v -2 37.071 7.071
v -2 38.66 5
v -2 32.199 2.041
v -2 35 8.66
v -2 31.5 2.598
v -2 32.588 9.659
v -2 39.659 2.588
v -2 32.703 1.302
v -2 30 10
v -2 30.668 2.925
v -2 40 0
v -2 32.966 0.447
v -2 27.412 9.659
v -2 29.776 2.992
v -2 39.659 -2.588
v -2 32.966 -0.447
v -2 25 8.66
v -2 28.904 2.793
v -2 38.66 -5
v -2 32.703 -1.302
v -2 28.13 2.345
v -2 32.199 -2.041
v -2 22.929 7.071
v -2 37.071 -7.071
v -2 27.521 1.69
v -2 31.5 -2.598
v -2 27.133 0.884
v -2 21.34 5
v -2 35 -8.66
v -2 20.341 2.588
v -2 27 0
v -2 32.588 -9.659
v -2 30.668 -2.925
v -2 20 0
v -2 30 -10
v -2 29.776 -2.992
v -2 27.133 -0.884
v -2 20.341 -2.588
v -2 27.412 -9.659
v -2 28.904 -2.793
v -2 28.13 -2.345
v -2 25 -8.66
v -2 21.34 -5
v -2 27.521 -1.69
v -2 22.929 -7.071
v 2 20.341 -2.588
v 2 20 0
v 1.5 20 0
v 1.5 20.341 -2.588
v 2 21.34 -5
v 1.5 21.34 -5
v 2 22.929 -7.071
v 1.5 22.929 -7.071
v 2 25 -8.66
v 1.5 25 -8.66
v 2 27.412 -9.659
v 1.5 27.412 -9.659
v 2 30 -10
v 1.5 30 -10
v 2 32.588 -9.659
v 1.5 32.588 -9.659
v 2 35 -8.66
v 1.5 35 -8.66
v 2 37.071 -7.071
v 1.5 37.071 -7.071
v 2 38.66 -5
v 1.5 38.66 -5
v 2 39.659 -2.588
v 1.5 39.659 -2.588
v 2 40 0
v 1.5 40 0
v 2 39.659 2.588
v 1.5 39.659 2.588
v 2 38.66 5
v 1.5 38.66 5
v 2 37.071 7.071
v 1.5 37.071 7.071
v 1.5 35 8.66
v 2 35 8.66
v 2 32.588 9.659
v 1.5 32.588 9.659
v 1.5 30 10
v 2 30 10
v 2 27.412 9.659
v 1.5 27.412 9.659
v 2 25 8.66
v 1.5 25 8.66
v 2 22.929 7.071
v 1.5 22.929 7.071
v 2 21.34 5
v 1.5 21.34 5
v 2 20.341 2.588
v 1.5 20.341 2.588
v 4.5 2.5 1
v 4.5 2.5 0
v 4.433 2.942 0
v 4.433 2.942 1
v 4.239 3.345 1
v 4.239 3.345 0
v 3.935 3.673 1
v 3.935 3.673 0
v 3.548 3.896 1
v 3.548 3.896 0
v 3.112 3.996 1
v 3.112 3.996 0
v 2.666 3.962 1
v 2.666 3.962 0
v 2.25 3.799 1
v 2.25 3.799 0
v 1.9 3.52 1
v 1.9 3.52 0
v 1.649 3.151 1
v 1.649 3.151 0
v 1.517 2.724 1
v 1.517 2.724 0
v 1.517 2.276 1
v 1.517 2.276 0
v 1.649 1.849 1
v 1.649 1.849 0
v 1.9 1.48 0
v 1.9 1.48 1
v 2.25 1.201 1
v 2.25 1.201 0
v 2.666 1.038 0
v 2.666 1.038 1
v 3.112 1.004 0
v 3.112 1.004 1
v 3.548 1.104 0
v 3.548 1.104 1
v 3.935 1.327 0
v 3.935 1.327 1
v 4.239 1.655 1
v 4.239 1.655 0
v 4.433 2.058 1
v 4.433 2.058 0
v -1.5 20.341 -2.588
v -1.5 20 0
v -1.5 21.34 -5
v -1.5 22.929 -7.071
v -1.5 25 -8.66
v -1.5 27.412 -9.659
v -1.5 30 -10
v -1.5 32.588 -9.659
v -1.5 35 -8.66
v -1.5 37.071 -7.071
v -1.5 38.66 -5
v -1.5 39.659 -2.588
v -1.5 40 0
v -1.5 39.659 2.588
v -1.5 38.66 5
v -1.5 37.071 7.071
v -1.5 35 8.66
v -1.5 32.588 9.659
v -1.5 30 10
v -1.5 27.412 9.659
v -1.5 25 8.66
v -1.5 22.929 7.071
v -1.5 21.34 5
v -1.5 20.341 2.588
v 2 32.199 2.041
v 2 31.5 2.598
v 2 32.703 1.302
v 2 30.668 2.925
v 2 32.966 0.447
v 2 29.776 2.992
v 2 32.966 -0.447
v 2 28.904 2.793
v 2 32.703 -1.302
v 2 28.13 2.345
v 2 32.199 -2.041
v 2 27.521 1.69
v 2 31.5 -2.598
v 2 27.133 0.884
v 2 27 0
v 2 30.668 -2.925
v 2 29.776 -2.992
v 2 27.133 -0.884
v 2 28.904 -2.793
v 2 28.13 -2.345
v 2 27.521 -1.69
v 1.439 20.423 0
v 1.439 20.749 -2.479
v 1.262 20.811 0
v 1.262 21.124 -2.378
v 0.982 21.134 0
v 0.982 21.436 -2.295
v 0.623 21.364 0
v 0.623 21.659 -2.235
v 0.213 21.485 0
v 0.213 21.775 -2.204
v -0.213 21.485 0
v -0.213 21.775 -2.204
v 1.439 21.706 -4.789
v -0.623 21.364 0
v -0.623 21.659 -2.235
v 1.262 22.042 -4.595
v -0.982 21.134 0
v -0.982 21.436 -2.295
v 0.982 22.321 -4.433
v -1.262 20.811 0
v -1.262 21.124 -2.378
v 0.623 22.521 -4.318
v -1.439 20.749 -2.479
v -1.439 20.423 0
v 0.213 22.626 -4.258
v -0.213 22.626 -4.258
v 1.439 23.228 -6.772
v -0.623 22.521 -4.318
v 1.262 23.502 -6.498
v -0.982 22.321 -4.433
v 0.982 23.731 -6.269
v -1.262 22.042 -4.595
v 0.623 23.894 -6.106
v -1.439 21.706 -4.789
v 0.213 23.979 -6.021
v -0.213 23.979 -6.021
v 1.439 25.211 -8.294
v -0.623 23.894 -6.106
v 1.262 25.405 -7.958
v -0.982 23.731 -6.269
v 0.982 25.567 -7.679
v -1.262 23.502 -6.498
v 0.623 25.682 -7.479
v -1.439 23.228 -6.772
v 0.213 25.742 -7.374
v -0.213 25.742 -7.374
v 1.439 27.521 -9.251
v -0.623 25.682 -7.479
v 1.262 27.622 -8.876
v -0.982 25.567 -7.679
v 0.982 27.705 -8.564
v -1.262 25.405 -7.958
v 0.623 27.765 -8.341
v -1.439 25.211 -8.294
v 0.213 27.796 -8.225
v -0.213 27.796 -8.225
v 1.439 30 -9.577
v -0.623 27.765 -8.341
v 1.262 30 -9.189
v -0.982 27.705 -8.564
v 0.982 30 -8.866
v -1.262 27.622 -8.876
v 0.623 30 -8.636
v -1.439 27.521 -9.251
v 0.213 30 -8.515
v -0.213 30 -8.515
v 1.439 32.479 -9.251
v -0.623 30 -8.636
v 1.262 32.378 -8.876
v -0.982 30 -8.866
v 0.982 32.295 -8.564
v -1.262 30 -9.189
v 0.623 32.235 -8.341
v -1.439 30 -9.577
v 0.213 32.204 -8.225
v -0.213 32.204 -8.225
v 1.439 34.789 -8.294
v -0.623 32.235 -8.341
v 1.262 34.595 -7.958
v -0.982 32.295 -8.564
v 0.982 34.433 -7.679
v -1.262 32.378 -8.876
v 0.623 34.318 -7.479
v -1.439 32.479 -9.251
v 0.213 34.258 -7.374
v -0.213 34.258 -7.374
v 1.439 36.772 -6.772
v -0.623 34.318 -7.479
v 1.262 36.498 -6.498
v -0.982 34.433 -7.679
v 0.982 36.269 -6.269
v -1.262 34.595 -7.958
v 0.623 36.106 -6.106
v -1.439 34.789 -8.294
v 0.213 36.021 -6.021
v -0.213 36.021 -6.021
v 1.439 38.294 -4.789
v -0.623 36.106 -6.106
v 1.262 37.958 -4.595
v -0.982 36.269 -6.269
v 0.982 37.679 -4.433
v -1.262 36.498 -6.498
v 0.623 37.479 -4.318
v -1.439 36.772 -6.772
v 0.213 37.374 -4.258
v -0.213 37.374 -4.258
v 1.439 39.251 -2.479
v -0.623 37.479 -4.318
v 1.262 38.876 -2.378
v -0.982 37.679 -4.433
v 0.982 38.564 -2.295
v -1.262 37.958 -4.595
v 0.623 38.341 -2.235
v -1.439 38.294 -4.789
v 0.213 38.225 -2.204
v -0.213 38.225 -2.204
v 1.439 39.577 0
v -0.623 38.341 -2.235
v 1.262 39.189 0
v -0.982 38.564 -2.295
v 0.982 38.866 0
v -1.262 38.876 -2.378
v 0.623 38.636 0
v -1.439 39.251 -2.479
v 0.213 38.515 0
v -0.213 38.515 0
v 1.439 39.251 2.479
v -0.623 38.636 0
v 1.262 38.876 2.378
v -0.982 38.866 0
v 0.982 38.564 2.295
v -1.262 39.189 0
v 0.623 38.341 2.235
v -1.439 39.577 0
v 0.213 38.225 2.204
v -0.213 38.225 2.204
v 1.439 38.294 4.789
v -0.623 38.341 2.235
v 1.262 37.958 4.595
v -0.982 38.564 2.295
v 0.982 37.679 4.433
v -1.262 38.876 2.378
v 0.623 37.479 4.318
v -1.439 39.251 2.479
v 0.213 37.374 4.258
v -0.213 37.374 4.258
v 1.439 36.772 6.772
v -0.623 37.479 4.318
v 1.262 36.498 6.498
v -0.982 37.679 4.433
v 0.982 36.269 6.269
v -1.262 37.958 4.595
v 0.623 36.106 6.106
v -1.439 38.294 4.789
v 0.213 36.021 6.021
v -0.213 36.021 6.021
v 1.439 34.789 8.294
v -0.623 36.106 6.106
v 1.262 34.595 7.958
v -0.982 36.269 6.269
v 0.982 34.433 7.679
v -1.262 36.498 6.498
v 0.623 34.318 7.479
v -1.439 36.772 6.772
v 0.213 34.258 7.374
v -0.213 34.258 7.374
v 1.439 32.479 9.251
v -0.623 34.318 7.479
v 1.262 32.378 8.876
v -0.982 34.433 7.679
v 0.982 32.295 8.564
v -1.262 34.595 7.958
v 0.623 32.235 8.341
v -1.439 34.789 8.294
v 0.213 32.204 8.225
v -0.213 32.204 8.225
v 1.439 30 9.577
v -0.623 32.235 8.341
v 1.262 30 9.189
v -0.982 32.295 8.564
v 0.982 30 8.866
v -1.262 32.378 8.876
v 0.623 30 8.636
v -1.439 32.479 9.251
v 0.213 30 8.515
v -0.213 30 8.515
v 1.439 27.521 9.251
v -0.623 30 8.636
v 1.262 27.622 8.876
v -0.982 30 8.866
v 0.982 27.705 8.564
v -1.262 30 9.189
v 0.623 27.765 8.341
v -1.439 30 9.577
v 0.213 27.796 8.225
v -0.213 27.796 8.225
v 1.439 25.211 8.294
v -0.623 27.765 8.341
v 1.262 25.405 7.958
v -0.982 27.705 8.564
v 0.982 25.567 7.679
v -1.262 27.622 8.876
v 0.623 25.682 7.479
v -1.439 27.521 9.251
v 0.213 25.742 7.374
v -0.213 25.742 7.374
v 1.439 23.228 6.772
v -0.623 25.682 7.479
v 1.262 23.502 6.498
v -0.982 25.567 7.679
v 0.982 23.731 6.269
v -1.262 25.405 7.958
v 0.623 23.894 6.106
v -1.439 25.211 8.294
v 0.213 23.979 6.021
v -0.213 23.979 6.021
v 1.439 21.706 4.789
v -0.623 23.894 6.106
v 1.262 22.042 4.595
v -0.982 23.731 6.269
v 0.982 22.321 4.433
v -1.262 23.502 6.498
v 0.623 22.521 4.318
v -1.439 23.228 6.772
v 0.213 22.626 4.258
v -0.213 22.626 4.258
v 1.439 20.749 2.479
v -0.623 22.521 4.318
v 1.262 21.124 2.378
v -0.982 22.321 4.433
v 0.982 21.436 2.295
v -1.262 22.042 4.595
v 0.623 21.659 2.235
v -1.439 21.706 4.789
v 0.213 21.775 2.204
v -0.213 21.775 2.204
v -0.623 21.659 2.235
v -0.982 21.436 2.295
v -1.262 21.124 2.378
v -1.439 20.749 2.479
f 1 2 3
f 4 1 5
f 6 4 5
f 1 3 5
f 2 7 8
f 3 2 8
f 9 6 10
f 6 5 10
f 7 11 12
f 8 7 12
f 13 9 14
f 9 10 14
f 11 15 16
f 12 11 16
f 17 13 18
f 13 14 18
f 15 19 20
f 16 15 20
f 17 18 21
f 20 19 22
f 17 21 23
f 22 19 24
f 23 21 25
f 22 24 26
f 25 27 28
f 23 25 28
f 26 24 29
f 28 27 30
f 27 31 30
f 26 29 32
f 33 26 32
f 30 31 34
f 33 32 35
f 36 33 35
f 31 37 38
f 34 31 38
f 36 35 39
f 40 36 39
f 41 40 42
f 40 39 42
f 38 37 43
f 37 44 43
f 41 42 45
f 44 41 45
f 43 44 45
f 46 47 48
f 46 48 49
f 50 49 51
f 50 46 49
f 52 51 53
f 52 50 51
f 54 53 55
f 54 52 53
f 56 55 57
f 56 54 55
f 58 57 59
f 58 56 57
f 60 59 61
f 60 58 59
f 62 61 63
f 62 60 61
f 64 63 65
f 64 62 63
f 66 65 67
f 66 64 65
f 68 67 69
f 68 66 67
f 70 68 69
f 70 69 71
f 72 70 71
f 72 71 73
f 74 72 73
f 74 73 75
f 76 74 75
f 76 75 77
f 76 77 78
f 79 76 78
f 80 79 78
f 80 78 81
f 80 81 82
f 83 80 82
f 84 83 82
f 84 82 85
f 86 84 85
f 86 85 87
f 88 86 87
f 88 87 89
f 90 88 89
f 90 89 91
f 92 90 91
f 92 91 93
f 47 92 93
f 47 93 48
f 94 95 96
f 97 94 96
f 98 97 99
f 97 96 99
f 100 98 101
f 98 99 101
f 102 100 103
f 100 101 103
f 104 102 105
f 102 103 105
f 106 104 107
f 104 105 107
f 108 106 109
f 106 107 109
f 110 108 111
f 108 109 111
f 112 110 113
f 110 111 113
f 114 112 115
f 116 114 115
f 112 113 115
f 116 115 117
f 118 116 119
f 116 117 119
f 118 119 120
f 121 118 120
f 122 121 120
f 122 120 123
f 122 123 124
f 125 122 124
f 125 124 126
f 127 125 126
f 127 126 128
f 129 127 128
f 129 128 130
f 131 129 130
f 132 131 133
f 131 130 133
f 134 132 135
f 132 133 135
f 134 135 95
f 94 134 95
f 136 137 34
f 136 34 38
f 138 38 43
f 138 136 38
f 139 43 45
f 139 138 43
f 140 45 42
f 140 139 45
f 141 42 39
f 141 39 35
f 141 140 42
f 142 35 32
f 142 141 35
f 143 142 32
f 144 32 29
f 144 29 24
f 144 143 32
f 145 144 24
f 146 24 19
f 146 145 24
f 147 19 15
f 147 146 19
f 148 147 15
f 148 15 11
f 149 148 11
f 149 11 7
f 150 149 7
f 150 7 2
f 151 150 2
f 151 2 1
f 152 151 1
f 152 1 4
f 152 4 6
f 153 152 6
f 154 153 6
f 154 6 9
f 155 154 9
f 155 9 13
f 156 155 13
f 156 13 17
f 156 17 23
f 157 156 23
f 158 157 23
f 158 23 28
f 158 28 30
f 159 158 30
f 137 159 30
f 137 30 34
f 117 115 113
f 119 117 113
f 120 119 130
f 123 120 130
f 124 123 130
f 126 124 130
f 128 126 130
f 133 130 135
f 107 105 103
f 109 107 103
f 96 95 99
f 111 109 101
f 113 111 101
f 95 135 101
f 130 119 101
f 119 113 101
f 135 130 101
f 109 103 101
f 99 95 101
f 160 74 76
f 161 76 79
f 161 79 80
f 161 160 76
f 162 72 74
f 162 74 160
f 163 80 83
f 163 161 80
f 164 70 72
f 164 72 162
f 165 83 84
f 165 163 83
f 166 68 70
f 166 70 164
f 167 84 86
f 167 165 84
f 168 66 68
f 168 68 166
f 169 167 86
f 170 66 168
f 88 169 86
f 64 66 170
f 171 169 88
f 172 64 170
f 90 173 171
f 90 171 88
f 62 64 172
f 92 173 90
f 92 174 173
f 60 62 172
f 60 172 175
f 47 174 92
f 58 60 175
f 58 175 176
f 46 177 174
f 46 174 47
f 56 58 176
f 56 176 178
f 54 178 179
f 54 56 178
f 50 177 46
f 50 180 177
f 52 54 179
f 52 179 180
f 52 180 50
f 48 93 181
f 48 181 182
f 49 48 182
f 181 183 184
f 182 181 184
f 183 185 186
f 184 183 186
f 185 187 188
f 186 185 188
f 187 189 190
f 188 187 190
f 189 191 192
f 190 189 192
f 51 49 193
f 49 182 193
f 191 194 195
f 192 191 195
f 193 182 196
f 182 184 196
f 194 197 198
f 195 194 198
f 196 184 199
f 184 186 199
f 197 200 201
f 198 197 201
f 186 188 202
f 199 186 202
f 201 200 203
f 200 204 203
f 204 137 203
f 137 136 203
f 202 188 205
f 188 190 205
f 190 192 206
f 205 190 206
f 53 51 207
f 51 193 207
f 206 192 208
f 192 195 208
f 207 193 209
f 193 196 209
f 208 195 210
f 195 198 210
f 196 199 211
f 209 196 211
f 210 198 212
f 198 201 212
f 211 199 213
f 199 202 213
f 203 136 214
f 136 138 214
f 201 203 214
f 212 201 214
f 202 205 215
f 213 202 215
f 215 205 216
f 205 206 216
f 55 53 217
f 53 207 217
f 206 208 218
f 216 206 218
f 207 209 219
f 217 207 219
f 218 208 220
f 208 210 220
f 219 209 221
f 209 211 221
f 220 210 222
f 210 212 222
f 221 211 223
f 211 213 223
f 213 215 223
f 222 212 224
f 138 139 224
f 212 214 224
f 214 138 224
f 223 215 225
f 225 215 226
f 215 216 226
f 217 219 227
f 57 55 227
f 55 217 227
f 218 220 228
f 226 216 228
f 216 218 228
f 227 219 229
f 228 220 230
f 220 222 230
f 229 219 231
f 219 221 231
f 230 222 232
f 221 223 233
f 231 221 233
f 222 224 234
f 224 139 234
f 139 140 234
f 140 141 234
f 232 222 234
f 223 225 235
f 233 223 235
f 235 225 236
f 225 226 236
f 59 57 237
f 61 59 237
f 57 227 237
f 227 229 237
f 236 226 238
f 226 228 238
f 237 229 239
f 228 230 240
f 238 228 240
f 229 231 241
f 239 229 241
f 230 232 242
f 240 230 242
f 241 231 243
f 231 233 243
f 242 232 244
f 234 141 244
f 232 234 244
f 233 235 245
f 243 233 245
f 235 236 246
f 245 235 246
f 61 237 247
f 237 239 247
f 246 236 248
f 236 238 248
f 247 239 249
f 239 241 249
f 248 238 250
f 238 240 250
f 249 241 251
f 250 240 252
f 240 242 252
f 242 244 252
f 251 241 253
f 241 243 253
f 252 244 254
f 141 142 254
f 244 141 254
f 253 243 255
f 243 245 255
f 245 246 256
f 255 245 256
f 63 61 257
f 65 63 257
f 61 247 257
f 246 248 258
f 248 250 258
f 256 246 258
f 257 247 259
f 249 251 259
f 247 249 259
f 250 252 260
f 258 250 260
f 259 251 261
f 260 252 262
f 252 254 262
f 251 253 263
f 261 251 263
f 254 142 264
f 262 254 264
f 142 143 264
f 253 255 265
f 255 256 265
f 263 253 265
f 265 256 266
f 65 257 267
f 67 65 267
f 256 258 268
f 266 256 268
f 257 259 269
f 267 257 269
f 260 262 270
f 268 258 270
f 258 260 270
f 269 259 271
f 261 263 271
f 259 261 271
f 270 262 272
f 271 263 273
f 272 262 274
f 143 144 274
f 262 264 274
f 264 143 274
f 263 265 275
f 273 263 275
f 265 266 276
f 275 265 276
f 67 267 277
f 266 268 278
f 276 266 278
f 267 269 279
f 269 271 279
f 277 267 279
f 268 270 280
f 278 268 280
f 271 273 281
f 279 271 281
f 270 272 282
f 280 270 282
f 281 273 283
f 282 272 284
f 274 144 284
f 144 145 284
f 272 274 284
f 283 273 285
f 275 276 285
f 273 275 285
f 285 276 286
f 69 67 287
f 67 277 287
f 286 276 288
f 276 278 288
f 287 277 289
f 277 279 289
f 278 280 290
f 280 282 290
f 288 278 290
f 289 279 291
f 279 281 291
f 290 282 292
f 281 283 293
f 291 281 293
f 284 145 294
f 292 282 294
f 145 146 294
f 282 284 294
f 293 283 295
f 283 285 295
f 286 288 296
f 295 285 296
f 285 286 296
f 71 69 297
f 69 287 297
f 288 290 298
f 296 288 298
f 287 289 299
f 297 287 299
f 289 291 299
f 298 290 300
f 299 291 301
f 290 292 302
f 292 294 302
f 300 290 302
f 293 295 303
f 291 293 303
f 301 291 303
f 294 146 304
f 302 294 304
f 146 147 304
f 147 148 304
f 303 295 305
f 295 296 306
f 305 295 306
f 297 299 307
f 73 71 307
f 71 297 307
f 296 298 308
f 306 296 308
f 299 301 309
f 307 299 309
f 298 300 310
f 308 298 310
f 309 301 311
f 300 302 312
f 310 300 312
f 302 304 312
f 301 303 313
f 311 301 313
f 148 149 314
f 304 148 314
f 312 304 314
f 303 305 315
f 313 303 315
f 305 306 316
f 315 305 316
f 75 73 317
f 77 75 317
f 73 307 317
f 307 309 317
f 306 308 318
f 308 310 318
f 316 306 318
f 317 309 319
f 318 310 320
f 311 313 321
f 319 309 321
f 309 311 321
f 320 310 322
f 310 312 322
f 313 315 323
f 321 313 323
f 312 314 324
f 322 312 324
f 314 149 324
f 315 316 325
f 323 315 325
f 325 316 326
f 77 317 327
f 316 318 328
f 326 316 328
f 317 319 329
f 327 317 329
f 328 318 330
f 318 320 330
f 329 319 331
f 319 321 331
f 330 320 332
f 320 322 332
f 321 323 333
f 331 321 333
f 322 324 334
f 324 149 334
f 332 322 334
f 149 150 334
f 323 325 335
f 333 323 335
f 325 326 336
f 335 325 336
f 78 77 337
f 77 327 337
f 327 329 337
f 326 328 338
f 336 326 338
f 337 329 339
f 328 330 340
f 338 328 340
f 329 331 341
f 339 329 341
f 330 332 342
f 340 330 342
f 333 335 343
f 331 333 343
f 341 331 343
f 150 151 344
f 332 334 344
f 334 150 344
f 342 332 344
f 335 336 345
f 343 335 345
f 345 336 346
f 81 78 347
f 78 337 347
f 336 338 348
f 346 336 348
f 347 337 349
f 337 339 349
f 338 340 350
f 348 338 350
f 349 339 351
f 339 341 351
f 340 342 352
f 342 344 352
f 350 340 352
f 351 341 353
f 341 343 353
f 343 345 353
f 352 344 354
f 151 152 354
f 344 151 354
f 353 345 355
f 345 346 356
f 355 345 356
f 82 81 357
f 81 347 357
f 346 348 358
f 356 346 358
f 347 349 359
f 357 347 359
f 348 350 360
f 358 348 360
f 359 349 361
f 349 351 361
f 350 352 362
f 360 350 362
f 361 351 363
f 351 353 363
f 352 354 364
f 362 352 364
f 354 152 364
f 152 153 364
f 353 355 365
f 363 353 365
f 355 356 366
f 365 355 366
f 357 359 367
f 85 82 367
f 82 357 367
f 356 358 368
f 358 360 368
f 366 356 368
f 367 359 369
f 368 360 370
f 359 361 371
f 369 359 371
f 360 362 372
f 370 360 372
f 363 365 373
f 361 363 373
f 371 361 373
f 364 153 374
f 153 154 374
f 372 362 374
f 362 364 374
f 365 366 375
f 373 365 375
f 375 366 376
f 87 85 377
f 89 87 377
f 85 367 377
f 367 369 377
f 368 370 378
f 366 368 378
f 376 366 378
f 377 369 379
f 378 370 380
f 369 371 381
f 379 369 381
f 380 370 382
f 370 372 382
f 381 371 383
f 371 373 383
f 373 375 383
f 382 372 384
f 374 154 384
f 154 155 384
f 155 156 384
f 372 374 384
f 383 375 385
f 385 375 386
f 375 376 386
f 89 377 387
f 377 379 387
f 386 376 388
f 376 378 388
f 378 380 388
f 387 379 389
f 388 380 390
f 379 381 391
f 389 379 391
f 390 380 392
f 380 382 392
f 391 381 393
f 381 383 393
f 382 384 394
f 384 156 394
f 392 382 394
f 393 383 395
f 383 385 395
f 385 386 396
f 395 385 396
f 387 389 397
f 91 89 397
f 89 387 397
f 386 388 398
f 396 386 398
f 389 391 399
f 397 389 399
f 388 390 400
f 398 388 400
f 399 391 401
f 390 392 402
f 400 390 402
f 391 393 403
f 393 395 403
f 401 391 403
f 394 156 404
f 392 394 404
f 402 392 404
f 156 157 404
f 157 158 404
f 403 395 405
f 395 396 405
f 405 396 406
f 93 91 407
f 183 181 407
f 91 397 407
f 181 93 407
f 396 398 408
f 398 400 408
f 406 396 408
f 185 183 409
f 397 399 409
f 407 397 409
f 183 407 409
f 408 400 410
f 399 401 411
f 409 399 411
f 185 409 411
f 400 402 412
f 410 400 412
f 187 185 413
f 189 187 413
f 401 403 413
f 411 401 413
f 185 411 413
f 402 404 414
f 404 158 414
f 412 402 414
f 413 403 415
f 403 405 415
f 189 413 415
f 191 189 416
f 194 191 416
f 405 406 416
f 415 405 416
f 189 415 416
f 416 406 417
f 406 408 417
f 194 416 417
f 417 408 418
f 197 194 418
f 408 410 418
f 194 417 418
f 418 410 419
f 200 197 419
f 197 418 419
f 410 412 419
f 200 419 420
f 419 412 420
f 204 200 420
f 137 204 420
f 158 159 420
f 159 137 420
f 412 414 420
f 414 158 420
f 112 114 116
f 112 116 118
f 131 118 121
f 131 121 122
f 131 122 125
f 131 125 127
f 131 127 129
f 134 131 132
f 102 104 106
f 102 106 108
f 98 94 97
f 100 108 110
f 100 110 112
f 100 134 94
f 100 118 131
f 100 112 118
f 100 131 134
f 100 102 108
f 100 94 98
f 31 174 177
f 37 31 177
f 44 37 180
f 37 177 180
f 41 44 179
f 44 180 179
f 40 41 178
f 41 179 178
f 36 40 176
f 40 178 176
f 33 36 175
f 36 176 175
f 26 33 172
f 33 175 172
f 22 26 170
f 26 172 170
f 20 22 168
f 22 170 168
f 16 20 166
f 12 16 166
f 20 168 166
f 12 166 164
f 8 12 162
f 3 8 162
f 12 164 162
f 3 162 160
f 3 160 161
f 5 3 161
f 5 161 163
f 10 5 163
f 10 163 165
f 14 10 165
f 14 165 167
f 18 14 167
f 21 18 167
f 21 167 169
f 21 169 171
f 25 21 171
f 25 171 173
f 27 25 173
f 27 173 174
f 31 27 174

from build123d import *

# Parameters (mm, degrees)
CIRCLE002_R    = 1.5
RECTANGLE001_W = 2
RECTANGLE001_H = 7
RECTANGLE_W    = 2
RECTANGLE_H    = 7
CIRCLE005_R    = 1.5
EXTRUDE_DEPTH  = 1


with BuildPart() as revolve_body:
    # Circle002 → Revolve (revolve)
    with BuildSketch(Plane(origin=(0, 20, 0), x_dir=(1, 0, 0), z_dir=(0, 0, 1))):
        Circle(CIRCLE002_R)
    revolve(axis=Axis((0, 30, 0), (1, 0, 0)))


with BuildPart() as revolve002:
    # Rectangle001 → Revolve002 (revolve)
    with BuildSketch(Plane(origin=(0, 20, 0), x_dir=(1, 0, 0), z_dir=(0, 0, 1))):
        with Locations((1, 3.5)):
            Rectangle(RECTANGLE001_W, RECTANGLE001_H)
    revolve(axis=Axis((0, 30, 0), (1, 0, 0)))


with BuildPart() as cut:
    # Rectangle → Revolve001 (revolve)
    with BuildSketch(Plane(origin=(-2, 20, 0), x_dir=(1, 0, 0), z_dir=(0, 0, 1))):
        with Locations((1, 3.5)):
            Rectangle(RECTANGLE_W, RECTANGLE_H)
    revolve(axis=Axis((0, 30, 0), (1, 0, 0)))

    # Fusion: union Revolve002
    add(revolve002.part)

    # Cut: cut Revolve body
    add(revolve_body.part, mode=Mode.SUBTRACT)


with BuildPart() as extrude_body:
    # Circle005 → Extrude (new body)
    with BuildSketch(Plane(origin=(3, 2.5, 0), x_dir=(1, 0, 0), z_dir=(0, 0, 1))):
        Circle(CIRCLE005_R)
    extrude(amount=EXTRUDE_DEPTH)


solid = Compound([cut.part, extrude_body.part])
